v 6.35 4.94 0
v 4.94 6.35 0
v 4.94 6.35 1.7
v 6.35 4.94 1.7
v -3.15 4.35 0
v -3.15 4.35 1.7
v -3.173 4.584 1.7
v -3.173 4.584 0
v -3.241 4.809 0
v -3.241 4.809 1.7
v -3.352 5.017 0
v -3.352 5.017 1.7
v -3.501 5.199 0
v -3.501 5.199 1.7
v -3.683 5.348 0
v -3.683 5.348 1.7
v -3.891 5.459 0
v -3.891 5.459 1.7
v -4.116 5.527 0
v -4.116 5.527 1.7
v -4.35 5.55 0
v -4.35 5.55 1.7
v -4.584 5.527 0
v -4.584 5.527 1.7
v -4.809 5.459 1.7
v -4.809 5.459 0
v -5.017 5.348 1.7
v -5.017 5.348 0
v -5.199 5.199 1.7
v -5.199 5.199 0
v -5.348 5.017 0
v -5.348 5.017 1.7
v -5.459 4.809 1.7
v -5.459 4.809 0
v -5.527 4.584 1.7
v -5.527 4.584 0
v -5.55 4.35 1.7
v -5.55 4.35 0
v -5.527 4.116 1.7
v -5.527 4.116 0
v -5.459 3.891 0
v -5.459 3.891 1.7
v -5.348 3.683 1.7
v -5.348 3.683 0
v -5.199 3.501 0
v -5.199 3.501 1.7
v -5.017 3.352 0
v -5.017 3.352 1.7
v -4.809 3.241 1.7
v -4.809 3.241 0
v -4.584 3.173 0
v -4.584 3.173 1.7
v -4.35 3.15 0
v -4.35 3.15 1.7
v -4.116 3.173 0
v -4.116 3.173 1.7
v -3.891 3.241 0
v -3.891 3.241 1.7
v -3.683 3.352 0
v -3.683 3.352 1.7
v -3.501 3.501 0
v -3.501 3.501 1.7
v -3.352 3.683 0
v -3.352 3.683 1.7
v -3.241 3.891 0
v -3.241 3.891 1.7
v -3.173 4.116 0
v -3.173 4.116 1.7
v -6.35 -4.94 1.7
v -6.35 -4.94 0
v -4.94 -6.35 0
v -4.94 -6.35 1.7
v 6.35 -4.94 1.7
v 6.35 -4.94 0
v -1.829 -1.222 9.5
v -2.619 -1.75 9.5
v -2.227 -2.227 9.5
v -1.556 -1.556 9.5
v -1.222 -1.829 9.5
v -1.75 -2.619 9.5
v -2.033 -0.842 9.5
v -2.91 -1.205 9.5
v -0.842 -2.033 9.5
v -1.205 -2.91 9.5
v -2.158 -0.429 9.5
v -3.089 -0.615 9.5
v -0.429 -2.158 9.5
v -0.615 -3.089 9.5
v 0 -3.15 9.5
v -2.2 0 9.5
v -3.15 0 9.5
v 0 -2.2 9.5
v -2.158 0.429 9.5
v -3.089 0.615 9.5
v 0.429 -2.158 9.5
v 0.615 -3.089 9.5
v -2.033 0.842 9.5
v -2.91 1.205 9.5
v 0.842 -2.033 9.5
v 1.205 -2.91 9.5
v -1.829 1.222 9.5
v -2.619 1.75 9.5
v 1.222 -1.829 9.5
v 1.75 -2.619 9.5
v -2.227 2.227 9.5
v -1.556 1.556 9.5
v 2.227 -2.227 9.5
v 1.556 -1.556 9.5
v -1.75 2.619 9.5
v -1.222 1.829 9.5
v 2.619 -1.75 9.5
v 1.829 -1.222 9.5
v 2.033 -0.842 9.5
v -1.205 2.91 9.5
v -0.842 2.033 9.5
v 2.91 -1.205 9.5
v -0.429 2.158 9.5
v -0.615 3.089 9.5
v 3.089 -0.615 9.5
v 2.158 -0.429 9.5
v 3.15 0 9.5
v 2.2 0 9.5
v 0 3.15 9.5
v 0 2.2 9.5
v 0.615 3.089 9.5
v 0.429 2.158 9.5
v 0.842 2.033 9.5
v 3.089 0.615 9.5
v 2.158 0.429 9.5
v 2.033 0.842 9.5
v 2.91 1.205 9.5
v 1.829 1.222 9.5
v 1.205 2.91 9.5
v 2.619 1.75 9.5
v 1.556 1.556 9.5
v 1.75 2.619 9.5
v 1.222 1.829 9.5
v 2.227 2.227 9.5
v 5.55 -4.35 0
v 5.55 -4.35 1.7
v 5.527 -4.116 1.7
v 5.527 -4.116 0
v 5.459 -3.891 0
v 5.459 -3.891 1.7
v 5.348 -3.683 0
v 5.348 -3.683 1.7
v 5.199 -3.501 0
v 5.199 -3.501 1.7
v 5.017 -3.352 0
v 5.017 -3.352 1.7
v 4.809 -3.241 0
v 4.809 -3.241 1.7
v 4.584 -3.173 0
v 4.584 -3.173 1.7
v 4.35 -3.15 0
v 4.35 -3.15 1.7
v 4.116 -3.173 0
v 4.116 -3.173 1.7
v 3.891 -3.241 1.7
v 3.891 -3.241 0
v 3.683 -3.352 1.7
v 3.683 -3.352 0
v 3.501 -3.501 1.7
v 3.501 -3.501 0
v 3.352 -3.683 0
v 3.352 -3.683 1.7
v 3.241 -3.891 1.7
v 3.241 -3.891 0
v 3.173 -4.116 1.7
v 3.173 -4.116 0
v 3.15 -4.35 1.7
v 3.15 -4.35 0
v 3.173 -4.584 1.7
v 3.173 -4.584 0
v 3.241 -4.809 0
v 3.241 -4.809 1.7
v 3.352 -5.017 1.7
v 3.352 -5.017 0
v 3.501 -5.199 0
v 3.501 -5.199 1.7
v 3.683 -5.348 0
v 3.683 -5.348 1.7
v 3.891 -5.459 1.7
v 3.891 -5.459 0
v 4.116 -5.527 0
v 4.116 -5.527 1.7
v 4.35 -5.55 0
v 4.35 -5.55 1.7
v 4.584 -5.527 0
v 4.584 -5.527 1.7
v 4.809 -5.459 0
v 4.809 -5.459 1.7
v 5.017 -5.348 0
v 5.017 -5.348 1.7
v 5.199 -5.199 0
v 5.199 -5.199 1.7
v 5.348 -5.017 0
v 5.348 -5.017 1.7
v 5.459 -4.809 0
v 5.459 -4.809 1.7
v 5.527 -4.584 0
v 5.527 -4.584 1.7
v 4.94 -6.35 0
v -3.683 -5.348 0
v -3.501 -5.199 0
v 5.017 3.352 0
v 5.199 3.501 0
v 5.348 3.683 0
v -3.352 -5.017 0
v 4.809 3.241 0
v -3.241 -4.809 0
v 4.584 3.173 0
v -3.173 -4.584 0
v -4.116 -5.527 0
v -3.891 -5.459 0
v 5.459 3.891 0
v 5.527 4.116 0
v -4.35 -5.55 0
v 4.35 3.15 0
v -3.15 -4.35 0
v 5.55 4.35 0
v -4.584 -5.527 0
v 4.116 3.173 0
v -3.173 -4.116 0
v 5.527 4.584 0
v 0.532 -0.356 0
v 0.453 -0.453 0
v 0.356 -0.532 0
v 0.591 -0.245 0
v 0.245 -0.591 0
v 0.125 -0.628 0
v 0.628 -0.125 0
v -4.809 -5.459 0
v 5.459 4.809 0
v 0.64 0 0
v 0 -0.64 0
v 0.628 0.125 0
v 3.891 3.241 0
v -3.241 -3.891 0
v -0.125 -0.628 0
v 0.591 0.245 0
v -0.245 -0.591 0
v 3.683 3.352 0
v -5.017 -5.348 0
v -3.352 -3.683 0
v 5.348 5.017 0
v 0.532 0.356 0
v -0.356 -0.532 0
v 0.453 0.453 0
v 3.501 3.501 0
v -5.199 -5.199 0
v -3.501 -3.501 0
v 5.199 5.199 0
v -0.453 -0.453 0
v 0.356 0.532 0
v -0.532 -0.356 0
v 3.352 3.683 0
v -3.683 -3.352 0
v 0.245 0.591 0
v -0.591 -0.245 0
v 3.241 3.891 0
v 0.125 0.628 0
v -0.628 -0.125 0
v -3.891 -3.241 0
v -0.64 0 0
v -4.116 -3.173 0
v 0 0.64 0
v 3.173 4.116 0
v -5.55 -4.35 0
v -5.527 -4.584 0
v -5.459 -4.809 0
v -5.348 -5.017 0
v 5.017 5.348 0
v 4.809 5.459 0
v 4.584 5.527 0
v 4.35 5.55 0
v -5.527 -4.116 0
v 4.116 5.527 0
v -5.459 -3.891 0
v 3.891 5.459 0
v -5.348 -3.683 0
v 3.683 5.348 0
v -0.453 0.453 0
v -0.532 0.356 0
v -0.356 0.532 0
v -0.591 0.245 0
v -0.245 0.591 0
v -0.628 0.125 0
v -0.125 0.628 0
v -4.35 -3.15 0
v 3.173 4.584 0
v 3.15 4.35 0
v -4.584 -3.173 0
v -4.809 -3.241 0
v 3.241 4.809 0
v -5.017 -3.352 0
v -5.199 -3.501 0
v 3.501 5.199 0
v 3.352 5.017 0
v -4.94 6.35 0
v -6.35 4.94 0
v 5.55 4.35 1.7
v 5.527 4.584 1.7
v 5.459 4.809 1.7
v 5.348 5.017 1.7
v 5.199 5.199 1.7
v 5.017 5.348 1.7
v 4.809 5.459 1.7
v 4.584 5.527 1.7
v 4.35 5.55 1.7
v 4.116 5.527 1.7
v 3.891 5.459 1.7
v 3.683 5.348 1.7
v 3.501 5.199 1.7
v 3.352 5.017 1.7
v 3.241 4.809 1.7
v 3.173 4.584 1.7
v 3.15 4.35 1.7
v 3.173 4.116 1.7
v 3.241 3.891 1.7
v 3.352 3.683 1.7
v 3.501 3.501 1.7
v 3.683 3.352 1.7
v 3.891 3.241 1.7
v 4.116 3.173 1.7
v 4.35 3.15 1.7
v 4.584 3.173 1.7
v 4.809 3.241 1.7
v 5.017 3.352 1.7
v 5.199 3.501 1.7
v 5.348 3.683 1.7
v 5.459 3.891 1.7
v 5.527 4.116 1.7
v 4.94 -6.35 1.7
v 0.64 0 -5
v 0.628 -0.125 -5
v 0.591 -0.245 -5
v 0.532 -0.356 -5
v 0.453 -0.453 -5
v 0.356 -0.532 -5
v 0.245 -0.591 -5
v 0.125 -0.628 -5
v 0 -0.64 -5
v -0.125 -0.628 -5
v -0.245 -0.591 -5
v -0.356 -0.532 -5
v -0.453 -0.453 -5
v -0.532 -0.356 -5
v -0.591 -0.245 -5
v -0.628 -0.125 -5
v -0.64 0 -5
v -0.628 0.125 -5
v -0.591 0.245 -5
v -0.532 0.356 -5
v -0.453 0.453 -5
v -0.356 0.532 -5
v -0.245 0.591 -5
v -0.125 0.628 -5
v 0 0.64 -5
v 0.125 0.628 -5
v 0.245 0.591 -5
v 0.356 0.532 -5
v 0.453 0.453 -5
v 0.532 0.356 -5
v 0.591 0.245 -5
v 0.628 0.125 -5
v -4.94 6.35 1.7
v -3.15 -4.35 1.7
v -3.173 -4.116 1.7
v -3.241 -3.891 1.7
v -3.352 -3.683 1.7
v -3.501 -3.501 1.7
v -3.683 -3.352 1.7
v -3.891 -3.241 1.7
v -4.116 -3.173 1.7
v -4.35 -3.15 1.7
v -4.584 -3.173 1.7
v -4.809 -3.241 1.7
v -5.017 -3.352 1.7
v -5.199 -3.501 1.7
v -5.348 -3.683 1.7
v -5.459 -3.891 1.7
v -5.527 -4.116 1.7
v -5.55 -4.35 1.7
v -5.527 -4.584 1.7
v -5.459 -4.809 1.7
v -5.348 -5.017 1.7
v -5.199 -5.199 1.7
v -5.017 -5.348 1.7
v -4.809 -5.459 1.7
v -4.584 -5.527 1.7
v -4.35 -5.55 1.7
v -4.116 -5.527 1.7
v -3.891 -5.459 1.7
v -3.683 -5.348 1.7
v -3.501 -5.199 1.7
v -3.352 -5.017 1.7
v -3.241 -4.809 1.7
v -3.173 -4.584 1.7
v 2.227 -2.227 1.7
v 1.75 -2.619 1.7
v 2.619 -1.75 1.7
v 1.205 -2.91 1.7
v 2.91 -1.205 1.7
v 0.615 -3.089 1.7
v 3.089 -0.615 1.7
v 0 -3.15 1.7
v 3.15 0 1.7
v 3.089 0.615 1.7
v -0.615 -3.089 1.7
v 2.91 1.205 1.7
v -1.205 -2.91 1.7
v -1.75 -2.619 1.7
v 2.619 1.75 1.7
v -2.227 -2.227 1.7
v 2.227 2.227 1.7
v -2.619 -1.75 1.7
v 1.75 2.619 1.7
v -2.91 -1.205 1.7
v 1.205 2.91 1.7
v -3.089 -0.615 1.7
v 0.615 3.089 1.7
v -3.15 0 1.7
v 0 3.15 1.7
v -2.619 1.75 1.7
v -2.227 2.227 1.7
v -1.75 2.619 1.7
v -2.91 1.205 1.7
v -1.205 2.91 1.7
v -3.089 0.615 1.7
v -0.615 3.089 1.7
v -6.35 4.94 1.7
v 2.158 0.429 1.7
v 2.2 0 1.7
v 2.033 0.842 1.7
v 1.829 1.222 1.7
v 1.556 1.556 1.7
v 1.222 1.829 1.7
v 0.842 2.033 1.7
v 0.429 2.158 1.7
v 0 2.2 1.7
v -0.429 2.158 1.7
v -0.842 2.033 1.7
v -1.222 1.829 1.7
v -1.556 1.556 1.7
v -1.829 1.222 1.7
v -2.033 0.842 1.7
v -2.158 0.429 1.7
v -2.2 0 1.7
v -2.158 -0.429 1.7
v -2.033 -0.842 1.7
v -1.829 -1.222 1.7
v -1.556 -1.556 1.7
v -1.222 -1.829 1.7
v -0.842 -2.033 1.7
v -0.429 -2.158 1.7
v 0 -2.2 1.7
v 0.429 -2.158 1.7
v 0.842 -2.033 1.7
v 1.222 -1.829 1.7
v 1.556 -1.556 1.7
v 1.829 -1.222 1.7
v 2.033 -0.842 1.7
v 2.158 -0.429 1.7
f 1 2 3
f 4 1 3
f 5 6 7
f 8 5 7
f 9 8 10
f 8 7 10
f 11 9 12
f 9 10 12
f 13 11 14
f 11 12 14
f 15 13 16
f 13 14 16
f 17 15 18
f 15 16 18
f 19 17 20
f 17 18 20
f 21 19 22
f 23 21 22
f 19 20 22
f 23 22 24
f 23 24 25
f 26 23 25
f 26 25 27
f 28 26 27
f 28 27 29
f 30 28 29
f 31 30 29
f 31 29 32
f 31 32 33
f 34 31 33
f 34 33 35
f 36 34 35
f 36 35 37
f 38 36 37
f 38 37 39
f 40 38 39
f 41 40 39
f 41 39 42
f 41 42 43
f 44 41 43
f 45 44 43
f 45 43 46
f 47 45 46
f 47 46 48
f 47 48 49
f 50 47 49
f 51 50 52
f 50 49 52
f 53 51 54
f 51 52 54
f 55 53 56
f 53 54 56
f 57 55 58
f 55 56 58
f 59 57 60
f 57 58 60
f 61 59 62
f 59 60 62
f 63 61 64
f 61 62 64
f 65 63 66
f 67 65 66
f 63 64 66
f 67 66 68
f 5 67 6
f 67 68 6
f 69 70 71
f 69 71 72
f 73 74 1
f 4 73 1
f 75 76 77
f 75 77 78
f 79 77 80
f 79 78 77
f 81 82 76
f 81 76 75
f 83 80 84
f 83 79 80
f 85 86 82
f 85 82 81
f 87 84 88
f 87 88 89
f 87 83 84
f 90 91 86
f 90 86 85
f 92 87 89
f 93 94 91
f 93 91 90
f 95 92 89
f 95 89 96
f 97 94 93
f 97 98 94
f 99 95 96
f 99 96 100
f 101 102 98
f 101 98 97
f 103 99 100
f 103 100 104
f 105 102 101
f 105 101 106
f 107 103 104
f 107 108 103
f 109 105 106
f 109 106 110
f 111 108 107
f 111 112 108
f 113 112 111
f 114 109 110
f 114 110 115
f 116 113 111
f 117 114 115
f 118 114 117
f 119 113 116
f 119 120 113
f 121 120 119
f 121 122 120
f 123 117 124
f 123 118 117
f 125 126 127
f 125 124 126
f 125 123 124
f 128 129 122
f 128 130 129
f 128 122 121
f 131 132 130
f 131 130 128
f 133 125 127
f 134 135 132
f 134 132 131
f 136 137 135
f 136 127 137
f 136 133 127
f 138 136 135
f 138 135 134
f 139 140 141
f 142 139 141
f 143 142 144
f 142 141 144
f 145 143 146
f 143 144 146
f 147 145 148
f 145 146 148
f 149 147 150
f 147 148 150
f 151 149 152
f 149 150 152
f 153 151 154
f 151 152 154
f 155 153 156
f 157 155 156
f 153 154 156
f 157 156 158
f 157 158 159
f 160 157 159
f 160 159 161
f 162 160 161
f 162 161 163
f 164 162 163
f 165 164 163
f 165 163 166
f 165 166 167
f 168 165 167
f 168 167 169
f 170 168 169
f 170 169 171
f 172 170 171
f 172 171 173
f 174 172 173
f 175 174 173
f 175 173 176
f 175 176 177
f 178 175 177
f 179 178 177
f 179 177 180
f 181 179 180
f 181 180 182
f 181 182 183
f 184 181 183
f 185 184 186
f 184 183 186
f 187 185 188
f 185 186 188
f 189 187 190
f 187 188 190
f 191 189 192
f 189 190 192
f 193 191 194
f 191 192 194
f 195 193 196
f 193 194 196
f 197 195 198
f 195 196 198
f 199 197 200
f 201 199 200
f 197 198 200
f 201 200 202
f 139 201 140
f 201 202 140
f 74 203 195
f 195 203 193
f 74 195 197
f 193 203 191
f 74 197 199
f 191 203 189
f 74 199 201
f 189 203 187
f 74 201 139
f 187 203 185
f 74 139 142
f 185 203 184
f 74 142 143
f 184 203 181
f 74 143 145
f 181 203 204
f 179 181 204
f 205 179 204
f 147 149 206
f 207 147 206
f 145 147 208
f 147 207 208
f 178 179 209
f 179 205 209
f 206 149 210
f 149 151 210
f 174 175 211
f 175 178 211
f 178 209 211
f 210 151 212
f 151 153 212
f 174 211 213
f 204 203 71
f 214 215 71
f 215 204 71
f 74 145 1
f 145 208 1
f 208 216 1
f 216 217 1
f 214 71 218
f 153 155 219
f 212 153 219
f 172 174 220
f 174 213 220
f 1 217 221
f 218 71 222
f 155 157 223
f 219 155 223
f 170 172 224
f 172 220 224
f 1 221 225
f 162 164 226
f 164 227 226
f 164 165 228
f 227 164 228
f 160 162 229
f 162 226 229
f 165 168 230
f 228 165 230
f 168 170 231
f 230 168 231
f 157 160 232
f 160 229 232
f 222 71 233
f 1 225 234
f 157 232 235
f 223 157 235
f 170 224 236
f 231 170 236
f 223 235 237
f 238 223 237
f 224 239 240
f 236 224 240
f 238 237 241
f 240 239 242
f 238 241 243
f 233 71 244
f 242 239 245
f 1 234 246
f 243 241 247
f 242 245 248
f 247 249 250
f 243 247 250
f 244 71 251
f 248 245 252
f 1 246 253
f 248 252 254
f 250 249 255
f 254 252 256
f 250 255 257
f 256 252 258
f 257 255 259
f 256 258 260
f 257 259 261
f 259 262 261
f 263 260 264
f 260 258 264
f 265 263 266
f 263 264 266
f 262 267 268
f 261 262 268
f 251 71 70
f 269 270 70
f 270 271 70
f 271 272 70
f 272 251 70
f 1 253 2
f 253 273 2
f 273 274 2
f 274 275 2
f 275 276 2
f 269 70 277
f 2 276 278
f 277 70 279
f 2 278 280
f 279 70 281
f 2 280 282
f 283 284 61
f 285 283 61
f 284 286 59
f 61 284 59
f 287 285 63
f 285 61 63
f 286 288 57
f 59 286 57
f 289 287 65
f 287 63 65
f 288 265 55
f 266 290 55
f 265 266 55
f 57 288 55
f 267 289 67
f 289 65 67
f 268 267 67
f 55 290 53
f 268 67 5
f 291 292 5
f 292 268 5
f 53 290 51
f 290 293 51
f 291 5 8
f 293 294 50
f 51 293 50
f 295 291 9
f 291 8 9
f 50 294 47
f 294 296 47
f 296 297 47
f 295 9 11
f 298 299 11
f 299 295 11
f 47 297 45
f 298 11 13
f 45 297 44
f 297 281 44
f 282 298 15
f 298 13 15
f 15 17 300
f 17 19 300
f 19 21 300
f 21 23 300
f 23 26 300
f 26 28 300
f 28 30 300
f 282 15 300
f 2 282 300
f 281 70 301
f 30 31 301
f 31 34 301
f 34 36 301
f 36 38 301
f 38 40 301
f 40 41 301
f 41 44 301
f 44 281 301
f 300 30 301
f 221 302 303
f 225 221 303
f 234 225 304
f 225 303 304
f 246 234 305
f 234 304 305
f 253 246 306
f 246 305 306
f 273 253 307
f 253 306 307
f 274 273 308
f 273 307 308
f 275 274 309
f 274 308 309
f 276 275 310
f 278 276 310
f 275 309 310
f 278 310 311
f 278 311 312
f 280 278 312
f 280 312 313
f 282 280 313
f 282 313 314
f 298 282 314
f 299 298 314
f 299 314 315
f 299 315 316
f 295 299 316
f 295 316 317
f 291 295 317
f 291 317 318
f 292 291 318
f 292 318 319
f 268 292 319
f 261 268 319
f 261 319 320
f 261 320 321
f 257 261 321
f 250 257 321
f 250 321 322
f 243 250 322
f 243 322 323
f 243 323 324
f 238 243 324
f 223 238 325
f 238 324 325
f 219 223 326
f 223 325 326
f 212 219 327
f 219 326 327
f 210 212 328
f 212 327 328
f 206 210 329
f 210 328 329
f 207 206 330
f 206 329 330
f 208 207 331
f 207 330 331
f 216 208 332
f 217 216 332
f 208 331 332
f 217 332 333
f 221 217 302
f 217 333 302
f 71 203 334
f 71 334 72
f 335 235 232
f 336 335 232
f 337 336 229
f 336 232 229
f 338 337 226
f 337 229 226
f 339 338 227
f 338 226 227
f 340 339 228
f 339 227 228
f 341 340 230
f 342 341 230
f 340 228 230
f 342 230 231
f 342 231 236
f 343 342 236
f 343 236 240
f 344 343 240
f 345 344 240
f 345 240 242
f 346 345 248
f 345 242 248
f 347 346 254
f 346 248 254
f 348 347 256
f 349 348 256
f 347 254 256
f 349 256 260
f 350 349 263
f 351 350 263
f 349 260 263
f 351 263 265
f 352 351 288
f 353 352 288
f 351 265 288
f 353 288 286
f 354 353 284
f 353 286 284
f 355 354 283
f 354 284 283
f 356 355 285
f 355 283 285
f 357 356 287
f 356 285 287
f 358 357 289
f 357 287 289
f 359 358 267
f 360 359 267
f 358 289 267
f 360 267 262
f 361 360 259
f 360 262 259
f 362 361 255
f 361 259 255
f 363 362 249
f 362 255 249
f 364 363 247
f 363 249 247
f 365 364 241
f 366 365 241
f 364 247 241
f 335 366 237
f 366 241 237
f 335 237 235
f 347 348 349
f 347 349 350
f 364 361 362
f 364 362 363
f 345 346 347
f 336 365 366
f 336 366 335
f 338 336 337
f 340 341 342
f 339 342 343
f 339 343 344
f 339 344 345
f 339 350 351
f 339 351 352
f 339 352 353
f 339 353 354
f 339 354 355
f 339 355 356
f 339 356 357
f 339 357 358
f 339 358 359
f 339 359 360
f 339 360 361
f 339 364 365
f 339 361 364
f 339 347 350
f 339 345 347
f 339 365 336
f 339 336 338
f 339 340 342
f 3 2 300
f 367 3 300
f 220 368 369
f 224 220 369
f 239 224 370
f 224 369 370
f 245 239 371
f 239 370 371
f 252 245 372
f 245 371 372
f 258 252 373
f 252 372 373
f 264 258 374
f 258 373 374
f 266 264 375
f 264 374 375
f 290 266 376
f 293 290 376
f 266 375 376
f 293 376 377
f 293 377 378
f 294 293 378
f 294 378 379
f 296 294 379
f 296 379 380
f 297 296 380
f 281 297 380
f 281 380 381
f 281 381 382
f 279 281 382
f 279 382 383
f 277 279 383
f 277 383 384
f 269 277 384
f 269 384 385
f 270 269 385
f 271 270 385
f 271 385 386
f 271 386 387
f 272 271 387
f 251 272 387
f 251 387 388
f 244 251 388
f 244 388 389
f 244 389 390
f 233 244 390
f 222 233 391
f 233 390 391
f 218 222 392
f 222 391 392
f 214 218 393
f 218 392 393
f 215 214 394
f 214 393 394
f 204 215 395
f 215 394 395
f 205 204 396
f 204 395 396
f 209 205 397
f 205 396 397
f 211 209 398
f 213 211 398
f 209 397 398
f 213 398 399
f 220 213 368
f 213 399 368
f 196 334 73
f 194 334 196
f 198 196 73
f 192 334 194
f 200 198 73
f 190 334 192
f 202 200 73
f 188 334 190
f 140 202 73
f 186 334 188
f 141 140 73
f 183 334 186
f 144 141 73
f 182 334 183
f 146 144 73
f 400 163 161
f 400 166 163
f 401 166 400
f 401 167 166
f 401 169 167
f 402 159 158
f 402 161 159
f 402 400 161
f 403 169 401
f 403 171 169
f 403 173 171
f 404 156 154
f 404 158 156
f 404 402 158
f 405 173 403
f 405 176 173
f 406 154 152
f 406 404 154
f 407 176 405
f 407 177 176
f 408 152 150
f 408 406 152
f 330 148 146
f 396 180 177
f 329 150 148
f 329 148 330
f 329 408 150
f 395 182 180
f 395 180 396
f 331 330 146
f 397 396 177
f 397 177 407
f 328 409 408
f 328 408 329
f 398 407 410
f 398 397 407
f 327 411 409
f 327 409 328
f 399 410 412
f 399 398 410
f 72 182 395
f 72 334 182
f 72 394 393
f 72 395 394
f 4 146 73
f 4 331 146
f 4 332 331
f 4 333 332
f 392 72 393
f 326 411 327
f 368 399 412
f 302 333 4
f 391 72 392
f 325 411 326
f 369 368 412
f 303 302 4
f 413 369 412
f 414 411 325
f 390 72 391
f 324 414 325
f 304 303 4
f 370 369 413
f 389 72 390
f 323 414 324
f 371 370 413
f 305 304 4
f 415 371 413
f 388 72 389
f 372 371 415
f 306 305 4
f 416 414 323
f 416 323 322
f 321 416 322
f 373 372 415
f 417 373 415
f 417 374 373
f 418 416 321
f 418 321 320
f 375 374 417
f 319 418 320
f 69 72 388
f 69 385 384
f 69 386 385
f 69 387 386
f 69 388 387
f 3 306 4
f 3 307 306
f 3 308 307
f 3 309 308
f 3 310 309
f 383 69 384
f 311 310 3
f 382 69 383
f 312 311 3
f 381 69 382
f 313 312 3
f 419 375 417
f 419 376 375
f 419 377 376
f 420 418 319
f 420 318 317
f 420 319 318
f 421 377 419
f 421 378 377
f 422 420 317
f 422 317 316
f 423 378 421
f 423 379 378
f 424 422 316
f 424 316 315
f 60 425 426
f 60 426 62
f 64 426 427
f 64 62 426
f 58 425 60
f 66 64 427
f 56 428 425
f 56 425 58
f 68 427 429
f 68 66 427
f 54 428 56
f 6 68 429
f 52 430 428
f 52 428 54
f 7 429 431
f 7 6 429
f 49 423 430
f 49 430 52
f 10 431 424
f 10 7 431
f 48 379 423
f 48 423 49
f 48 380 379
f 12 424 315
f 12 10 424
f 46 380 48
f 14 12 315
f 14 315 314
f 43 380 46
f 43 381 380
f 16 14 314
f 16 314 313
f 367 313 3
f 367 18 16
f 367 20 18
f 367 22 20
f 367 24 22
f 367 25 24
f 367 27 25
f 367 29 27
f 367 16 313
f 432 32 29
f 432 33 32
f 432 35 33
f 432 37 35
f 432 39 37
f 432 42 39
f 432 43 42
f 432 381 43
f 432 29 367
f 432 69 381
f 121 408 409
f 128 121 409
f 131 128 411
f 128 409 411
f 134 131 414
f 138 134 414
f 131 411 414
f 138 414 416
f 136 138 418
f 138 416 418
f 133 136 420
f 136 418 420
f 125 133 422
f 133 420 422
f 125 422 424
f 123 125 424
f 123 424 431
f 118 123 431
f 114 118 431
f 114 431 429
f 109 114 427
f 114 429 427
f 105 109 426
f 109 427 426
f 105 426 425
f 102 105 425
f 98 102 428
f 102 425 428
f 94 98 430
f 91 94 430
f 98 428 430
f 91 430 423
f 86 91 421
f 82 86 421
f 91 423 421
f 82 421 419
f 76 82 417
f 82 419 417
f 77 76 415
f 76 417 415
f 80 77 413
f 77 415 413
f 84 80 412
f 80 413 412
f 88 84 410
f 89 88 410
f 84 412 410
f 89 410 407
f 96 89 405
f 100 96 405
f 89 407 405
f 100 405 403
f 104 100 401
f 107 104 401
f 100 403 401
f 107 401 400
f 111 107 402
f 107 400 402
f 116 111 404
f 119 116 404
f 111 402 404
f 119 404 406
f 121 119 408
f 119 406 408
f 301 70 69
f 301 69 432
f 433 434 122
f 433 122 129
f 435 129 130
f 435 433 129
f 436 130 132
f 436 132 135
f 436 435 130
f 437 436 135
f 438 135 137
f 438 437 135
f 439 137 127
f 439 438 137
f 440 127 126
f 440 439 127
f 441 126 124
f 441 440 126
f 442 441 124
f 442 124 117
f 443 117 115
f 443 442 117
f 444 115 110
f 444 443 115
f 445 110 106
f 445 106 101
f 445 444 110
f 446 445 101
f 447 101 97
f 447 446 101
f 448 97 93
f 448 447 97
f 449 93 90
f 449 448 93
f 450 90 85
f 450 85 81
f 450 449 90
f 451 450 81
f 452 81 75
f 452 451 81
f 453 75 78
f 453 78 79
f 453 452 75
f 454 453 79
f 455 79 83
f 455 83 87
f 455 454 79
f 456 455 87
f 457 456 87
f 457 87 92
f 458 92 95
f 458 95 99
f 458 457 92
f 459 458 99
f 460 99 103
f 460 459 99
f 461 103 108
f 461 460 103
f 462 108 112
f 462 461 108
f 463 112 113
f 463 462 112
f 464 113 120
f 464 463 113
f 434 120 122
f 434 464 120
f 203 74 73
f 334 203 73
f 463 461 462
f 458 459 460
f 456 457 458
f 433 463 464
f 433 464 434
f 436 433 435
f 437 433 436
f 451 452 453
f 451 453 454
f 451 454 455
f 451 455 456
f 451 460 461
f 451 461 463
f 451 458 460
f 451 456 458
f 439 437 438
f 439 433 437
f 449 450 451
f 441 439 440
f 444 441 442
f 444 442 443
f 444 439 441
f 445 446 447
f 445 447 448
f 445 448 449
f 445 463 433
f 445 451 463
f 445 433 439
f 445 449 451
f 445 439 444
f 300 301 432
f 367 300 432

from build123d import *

# Parameters (mm, degrees)
SKETCH1_W           = 12.7
SKETCH1_H           = 12.7
BOSS_EXTRUDE1_DEPTH = 1.7
CHAMFER3_SIZE       = 1.41
SKETCH2_R           = 1.2
CUT_EXTRUDE2_DEPTH  = 2.7
SKETCH3_R           = 3.15
SKETCH3_R_2         = 2.2
BOSS_EXTRUDE2_DEPTH = 7.8
SKETCH4_R           = 0.64
BOSS_EXTRUDE3_DEPTH = 5


with BuildPart() as part:
    # Sketch1 → Boss-Extrude1 (new body)
    with BuildSketch(Plane(origin=(0, 0, 0), x_dir=(0, 1, 0), z_dir=(0, 0, 1))):
        Rectangle(SKETCH1_W, SKETCH1_H)
    extrude(amount=BOSS_EXTRUDE1_DEPTH)

    # Chamfer3
    chamfer3_edges = [part.edges().sort_by_distance(p)[0] for p in [
        (6.35, 6.35, 0.85),
        (6.35, -6.35, 0.85),
        (-6.35, -6.35, 0.85),
        (-6.35, 6.35, 0.85),
    ]]
    chamfer(chamfer3_edges, length=CHAMFER3_SIZE)

    # Sketch2 → Cut-Extrude2 (cut, through all)
    with BuildSketch(Plane.XY.offset(1.7)):
        with Locations((-4.35, 4.35)):
            Circle(SKETCH2_R)
        with Locations((-4.35, -4.35)):
            Circle(SKETCH2_R)
        with Locations((4.35, -4.35)):
            Circle(SKETCH2_R)
        with Locations((4.35, 4.35)):
            Circle(SKETCH2_R)
    extrude(amount=-CUT_EXTRUDE2_DEPTH, mode=Mode.SUBTRACT)

    # Sketch3 → Boss-Extrude2 (add)
    with BuildSketch(Plane.XY.offset(1.7)):
        Circle(SKETCH3_R)
        Circle(SKETCH3_R_2, mode=Mode.SUBTRACT)
    extrude(amount=BOSS_EXTRUDE2_DEPTH)

    # Sketch4 → Boss-Extrude3 (add)
    with BuildSketch(Plane(origin=(0, 0, 0), x_dir=(1, 0, 0), z_dir=(0, 0, -1))):
        Circle(SKETCH4_R)
    extrude(amount=BOSS_EXTRUDE3_DEPTH)


solid = part.part
